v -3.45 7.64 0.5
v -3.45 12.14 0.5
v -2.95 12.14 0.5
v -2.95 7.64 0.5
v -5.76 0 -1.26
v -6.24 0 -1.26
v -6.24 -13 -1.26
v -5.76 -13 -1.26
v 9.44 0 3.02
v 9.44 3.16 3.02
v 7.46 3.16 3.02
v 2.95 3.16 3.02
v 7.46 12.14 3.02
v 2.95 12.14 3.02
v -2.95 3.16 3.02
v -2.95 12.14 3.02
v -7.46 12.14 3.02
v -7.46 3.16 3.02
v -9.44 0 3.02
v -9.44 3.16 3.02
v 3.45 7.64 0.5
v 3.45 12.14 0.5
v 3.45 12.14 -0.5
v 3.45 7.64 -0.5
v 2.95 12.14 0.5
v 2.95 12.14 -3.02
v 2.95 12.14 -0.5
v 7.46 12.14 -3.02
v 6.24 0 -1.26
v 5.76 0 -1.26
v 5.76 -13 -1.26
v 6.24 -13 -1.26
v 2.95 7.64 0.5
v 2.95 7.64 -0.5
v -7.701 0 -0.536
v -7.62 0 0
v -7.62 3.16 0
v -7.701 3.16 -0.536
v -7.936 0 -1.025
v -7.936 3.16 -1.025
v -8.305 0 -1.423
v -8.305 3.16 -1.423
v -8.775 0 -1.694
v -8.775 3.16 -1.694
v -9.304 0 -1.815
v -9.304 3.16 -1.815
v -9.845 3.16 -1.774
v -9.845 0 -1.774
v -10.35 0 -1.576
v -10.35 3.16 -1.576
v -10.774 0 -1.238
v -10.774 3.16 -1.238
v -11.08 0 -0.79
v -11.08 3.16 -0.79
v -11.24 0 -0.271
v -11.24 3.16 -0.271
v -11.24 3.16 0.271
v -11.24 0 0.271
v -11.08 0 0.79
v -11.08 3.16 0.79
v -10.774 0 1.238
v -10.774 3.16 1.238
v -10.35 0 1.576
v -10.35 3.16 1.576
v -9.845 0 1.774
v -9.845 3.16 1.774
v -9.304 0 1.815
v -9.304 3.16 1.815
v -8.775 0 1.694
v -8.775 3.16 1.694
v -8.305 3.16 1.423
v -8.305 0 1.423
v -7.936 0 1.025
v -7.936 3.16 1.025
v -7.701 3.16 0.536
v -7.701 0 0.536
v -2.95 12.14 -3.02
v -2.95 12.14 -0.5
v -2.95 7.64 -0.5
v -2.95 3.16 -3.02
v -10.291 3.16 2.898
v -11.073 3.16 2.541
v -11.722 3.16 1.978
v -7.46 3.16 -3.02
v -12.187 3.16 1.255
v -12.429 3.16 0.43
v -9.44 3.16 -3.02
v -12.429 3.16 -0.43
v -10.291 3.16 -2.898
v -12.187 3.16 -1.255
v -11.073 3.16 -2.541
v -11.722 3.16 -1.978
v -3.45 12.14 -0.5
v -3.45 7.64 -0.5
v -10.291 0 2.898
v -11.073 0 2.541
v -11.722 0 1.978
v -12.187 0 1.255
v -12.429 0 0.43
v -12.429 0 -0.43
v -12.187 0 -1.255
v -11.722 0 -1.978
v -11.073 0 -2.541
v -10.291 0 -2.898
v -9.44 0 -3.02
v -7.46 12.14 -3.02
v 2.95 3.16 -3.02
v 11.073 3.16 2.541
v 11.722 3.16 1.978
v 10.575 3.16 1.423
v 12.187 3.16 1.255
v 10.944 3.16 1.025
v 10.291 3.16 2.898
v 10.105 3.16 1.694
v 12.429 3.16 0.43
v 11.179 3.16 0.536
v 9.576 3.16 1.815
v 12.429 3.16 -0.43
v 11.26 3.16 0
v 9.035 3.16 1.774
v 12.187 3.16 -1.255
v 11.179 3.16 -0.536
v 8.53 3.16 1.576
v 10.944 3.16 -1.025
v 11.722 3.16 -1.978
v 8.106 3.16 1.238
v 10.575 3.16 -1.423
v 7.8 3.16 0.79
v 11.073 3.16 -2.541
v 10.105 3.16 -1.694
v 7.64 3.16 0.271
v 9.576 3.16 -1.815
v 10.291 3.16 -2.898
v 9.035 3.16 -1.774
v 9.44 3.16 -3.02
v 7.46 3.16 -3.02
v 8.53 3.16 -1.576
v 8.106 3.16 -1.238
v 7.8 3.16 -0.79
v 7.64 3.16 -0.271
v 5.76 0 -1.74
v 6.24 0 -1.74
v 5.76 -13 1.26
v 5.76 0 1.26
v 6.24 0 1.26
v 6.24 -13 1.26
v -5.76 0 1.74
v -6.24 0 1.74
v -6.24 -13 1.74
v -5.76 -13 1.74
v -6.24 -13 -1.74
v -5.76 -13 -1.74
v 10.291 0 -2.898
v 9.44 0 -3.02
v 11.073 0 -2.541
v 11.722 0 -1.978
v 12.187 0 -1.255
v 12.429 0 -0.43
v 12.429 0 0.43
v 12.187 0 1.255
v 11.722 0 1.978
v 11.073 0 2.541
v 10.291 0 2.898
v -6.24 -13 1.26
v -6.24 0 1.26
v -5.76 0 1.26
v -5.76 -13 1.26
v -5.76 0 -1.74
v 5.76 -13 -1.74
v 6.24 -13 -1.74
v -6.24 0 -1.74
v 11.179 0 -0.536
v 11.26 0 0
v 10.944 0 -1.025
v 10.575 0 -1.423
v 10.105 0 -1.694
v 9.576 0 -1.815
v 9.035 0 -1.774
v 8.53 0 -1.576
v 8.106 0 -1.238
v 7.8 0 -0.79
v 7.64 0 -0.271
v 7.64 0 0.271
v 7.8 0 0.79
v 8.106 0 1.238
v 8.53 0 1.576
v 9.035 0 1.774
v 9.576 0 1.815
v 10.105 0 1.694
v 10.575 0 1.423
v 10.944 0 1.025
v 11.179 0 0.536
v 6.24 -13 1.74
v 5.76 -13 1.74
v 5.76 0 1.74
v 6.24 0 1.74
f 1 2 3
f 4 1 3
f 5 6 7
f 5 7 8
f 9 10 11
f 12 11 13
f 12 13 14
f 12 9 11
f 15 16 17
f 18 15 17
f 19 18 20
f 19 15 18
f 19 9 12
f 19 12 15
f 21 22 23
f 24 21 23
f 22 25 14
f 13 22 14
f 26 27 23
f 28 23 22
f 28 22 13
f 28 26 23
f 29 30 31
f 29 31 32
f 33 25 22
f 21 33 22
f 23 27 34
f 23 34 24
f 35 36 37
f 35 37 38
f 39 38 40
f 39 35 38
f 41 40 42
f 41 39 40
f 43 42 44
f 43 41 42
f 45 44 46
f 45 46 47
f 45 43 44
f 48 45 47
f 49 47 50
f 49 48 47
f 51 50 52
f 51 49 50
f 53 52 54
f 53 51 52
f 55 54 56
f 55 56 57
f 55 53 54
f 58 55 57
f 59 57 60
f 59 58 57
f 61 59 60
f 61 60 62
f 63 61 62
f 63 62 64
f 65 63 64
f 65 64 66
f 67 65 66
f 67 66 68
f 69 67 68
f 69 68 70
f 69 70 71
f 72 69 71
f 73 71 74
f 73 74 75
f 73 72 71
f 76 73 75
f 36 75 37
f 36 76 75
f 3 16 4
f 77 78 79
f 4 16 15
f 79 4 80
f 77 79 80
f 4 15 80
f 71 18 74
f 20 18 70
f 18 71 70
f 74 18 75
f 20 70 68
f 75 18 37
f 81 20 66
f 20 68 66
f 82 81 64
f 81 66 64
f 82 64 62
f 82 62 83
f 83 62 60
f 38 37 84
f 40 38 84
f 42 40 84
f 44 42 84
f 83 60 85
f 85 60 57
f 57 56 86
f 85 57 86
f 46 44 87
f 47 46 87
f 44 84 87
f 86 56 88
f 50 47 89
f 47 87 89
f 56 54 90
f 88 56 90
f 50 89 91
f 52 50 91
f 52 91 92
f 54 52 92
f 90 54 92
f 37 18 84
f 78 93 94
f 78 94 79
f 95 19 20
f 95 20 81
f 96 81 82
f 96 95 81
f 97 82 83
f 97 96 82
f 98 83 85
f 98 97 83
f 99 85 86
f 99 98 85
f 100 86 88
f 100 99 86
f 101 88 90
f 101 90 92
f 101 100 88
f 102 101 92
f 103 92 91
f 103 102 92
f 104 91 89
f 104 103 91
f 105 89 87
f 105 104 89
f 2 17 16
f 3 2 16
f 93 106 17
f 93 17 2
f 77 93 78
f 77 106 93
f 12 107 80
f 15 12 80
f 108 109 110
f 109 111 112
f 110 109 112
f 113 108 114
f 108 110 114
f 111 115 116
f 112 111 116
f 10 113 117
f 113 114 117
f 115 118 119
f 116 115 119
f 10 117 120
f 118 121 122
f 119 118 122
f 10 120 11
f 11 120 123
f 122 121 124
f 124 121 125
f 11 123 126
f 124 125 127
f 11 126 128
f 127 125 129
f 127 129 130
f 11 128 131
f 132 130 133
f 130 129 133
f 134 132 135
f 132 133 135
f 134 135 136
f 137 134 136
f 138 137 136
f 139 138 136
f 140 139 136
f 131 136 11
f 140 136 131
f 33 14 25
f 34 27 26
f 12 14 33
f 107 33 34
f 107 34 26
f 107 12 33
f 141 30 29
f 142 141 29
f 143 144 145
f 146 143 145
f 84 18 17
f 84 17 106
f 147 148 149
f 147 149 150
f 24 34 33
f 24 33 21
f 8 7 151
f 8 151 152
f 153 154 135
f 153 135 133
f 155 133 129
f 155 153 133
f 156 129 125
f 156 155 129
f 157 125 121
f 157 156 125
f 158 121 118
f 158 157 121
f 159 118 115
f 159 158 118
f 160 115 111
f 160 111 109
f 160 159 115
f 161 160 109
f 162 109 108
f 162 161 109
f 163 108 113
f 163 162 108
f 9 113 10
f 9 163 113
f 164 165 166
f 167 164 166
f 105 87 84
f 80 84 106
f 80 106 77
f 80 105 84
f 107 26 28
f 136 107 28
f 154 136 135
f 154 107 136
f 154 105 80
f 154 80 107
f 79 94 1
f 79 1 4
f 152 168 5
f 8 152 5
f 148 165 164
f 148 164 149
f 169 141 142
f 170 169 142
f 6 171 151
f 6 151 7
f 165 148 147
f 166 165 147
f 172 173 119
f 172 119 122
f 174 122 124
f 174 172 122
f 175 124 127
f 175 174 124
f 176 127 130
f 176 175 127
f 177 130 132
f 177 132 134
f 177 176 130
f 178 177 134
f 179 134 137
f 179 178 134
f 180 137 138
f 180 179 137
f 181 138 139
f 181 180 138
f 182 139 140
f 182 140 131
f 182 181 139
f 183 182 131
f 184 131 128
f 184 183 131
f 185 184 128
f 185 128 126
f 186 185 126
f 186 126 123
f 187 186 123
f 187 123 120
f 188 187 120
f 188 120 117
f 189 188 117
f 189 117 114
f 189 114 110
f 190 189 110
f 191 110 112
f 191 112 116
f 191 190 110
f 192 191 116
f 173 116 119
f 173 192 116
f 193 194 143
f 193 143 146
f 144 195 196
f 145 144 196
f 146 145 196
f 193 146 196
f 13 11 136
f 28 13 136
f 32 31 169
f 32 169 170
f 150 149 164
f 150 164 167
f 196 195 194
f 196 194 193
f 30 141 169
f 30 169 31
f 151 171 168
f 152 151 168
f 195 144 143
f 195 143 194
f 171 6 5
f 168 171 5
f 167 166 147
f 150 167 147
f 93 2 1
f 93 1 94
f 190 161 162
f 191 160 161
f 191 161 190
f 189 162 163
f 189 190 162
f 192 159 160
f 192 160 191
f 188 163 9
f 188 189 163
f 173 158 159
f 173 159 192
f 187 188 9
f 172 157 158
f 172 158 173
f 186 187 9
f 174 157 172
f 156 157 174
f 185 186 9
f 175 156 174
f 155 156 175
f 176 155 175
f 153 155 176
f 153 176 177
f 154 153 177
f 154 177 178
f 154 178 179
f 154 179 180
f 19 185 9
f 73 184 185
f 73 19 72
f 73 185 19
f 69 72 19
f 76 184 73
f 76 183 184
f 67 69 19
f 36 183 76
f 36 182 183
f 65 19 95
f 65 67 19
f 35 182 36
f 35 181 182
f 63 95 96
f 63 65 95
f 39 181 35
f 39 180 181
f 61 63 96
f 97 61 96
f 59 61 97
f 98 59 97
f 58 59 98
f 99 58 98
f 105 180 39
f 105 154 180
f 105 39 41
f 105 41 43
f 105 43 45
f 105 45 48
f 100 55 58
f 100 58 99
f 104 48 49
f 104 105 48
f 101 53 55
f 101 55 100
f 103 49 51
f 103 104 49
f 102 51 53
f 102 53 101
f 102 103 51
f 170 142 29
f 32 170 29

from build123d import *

# Parameters (mm, degrees)
CROQUIS1_R                = 1.82
SALIENTE_EXTRUIR1_DEPTH   = 3.16
CROQUIS2_W                = 4.51
CROQUIS2_H                = 6.04
SALIENTE_EXTRUIR2_DEPTH   = 8.98
CROQUIS3_W                = 0.48
CROQUIS3_H                = 0.48
SALIENTE_EXTRUIR3_DEPTH   = 13
SALIENTE_EXTRUIR3_2_DEPTH = 13
SALIENTE_EXTRUIR3_3_DEPTH = 13
SALIENTE_EXTRUIR3_4_DEPTH = 13
CROQUIS4_W                = 6.9
CROQUIS4_H                = 1
CORTAR_EXTRUIR1_DEPTH     = 4.5


with BuildPart() as part:
    # Croquis1 → Saliente-Extruir1 (new body)
    with BuildSketch(Plane(origin=(0, 0, 0), x_dir=(1, 0, 0), z_dir=(0, 1, 0))):
        with BuildLine():
            Line((-9.44, 3.02), (9.44, 3.02))
            ThreePointArc((9.44, 3.02), (12.46, 0), (9.44, -3.02))
            Line((9.44, -3.02), (-9.44, -3.02))
            ThreePointArc((-9.44, -3.02), (-12.46, 0), (-9.44, 3.02))
        make_face()
        with Locations((-9.44, 0)):
            Circle(CROQUIS1_R, mode=Mode.SUBTRACT)
        with Locations((9.44, 0)):
            Circle(CROQUIS1_R, mode=Mode.SUBTRACT)
    extrude(amount=SALIENTE_EXTRUIR1_DEPTH)

    # Croquis2 → Saliente-Extruir2 (add)
    with BuildSketch(Plane(origin=(0, 3.16, 0), x_dir=(1, 0, 0), z_dir=(0, 1, 0))):
        with Locations((5.205, 0)):
            Rectangle(CROQUIS2_W, CROQUIS2_H)
        with Locations((-5.205, 0)):
            Rectangle(CROQUIS2_W, CROQUIS2_H)
    extrude(amount=SALIENTE_EXTRUIR2_DEPTH)

    # Croquis4 → Cortar-Extruir1 (cut)
    with BuildSketch(Plane(origin=(0, 12.14, 0), x_dir=(1, 0, 0), z_dir=(0, 1, 0))):
        Rectangle(CROQUIS4_W, CROQUIS4_H)
    extrude(amount=-CORTAR_EXTRUIR1_DEPTH, mode=Mode.SUBTRACT)


with BuildPart() as body_2:
    # Croquis3 → Saliente-Extruir3 (new body)
    with BuildSketch(Plane.XZ):
        with Locations((6, 1.5)):
            Rectangle(CROQUIS3_W, CROQUIS3_H)
    extrude(amount=SALIENTE_EXTRUIR3_DEPTH)


with BuildPart() as body_3:
    # Croquis3 → Saliente-Extruir3 2 (new body)
    with BuildSketch(Plane.XZ):
        with Locations((-6, 1.5)):
            Rectangle(CROQUIS3_W, CROQUIS3_H)
    extrude(amount=SALIENTE_EXTRUIR3_2_DEPTH)


with BuildPart() as body_4:
    # Croquis3 → Saliente-Extruir3 3 (new body)
    with BuildSketch(Plane.XZ):
        with Locations((6, -1.5)):
            Rectangle(CROQUIS3_W, CROQUIS3_H)
    extrude(amount=SALIENTE_EXTRUIR3_3_DEPTH)


with BuildPart() as body_5:
    # Croquis3 → Saliente-Extruir3 4 (new body)
    with BuildSketch(Plane.XZ):
        with Locations((-6, -1.5)):
            Rectangle(CROQUIS3_W, CROQUIS3_H)
    extrude(amount=SALIENTE_EXTRUIR3_4_DEPTH)


solid = Compound([part.part, body_2.part, body_3.part, body_4.part, body_5.part])
